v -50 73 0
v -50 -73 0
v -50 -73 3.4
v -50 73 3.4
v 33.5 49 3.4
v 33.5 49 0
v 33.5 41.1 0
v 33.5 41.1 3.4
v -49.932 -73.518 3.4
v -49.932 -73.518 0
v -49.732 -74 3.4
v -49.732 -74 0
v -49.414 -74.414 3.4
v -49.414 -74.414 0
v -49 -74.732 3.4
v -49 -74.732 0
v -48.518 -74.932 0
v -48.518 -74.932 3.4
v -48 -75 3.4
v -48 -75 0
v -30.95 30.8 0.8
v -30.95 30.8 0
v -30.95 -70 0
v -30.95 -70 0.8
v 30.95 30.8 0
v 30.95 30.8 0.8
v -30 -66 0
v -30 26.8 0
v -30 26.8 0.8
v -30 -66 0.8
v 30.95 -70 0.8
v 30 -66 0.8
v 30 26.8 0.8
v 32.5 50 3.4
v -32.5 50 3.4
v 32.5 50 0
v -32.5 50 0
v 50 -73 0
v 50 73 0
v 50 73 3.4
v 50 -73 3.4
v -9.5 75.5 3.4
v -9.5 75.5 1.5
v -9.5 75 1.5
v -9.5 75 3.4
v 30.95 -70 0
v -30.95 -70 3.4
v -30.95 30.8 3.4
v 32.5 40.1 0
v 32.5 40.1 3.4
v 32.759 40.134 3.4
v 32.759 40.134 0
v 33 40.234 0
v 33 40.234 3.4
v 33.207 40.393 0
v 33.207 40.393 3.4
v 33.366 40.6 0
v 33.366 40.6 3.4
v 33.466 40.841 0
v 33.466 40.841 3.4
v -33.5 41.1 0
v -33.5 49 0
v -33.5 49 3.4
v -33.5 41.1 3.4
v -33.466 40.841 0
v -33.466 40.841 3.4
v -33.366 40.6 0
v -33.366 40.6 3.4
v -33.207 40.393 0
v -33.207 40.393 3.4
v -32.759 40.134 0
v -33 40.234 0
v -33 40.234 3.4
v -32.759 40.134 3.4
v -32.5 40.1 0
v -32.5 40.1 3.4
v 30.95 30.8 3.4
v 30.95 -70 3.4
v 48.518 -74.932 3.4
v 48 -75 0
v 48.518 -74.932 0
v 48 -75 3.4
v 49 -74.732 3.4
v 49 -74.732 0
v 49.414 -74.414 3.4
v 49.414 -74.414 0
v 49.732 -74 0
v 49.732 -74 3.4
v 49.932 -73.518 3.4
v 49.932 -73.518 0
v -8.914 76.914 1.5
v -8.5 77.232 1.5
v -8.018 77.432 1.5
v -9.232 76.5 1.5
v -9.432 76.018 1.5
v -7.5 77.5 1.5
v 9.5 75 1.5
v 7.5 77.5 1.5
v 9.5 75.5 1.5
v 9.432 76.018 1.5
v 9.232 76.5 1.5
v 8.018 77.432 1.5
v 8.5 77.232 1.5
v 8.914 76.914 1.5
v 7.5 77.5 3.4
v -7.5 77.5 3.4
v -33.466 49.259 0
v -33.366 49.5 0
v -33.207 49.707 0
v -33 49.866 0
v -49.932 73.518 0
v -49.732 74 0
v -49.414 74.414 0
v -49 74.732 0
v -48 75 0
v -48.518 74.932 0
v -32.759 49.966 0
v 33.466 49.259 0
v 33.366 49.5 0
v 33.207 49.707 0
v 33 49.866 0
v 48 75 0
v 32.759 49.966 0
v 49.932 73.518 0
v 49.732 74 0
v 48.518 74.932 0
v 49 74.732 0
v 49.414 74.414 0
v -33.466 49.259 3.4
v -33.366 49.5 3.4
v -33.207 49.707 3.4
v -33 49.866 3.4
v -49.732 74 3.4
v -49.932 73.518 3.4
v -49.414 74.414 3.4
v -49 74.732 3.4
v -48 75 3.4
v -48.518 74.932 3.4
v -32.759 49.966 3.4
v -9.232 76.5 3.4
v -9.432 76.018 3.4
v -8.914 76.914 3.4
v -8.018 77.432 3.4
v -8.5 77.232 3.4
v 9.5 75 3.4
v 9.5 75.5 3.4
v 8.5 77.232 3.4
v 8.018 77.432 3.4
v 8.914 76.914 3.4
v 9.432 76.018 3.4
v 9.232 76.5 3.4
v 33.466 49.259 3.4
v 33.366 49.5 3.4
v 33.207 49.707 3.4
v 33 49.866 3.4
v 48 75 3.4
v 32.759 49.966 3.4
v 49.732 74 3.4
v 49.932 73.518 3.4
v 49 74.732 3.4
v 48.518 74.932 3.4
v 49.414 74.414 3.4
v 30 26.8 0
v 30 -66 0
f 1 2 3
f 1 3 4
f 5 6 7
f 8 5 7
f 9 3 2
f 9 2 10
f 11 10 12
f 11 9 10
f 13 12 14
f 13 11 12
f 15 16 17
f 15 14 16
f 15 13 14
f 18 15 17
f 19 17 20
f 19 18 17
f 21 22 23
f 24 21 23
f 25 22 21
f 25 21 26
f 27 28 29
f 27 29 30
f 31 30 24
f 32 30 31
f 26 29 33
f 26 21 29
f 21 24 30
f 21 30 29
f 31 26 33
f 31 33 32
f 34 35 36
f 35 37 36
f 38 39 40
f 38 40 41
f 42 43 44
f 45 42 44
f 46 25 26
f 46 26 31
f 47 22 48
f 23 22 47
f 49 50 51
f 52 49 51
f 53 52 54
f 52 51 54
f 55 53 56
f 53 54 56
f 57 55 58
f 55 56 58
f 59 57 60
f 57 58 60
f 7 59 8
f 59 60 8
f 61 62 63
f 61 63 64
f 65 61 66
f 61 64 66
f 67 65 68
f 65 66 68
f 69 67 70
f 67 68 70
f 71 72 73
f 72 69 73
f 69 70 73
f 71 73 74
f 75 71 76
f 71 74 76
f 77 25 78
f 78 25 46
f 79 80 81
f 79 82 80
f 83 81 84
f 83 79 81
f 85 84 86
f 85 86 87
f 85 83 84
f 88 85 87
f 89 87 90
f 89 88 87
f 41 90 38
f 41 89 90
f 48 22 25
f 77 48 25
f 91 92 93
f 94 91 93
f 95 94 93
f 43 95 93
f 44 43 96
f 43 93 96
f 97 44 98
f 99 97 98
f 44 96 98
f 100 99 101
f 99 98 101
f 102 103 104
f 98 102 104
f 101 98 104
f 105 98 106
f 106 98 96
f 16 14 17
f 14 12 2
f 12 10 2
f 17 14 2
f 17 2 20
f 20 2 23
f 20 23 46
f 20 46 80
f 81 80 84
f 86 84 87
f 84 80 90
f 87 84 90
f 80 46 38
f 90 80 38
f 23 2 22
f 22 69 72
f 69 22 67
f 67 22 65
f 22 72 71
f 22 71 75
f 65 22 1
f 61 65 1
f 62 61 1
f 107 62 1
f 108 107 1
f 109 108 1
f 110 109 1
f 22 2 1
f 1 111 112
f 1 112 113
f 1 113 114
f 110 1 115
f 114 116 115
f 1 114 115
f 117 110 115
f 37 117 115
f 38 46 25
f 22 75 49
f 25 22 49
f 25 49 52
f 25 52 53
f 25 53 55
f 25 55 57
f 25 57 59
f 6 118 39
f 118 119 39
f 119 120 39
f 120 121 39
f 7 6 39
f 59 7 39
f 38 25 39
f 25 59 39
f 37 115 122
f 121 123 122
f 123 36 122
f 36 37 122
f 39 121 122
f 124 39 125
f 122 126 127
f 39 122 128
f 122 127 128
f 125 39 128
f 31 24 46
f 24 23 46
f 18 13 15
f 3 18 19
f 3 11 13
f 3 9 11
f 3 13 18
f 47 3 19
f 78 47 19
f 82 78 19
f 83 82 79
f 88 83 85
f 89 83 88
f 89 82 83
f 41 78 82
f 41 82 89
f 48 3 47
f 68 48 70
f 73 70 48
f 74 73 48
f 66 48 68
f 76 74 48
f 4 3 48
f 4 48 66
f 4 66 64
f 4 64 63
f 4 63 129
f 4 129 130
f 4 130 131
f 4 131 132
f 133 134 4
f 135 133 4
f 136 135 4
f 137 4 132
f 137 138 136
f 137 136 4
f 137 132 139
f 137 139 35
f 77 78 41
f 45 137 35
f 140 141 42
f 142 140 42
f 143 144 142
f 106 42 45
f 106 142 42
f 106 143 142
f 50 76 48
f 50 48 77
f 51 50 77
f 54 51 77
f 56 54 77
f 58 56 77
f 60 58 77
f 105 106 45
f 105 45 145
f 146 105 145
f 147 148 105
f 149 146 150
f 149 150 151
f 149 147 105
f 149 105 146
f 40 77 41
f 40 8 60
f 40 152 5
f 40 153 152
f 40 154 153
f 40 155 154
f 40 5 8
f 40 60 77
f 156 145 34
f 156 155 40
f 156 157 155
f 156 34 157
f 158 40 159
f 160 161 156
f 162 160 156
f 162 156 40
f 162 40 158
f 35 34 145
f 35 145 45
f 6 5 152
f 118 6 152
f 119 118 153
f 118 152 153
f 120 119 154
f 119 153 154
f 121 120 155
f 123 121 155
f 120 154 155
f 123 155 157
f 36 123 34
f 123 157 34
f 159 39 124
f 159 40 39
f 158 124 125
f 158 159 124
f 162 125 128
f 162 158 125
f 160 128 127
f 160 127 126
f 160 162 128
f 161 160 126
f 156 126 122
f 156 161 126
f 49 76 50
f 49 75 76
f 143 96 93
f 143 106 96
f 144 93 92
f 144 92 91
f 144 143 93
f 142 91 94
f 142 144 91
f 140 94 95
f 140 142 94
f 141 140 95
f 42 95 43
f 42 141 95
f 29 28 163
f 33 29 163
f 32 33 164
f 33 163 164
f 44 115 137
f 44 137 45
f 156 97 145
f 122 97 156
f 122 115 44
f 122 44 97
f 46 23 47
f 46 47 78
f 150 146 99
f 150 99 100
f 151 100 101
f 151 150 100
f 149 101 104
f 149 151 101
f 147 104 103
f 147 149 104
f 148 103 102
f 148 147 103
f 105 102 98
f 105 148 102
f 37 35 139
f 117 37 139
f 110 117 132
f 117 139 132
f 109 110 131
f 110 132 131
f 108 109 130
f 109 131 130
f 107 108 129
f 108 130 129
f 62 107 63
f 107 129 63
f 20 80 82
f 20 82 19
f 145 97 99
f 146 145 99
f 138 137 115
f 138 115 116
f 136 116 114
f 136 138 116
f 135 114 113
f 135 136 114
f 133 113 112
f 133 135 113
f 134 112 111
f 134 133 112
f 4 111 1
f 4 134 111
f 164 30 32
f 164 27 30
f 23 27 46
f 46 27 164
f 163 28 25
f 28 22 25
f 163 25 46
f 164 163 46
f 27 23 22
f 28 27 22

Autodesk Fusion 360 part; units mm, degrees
sketch "Sketch1" plane through (0, 0, 0) normal (0, 0, 1) x (1, 0, 0)
  line L0 (50, -75) -> (-50, -75)
  line L1 (-50, -75) -> (-50, 75)
  line L2 (-50, 75) -> (50, 75)
  line L3 (50, 75) -> (50, -75)
  line L4 (50, -75) -> (-50, 75) construction
  line L5 (-50, -75) -> (50, 75) construction
  line L6 (9.5, 77.5) -> (-9.5, 77.5)
  line L7 (-9.5, 77.5) -> (-9.5, 75)
  line L8 (9.5, 75) -> (9.5, 77.5)
  line L9 (9.5, 77.5) -> (-9.5, 72.5) construction
  line L10 (-9.5, 77.5) -> (9.5, 72.5) construction
  line L11 (-33.5, 50) -> (33.5, 50)
  line L12 (-33.5, 40.1) -> (33.5, 40.1)
  line L13 (-33.5, 50) -> (-33.5, 40.1)
  line L14 (33.5, 50) -> (33.5, 40.1)
  line L15 (-50, 30.8) -> (50, 30.8)
  line L16 (-33.5, 50) -> (-33.5, 40.1)
  line L17 (33.5, 50) -> (33.5, 40.1)
  line L18 (-50, -70) -> (50, -70)
  line L19 (-30.95, 30.8) -> (-30.95, -70)
  line L20 (0, 30) -> (0, -70)
  line L21 (30.95, 30.8) -> (30.95, -70)
  line L22 (-30, 30.8) -> (-30, -70)
  line L23 (30, 30.8) -> (30, -70)
  line L24 (-30, 26.8) -> (30, 26.8)
  line L25 (-30, -66) -> (30, -66)
  point P0 (0, 75)
  dimension "d1" = 100
  dimension "d2" = 150
  dimension "d3" = 19
  dimension "d4" = 5
  dimension "d5" = 25
  dimension "d6" = 9.9
  dimension "d8" = 9.3
  dimension "d9" = 5
  dimension "d10" = 30.95
  dimension "d11" = 30
  dimension "d12" = 4
  dimension "d13" = 4
extrude "Extrude1" add sketch "Sketch1" along normal blind 3.4 contours L0 L1 L3 L18 | L3 L15 L18 L21 | L1 L15 L18 L19 | L1 L2 L3 L15 | L2 L6 L7 L8 makes body 1
extrude "Extrude2" add sketch "Sketch1" along normal blind 0.8 separate body contours L15 L18 L21 L23 | L15 L18 L19 L22 | L18 L20 L23 L25 | L18 L20 L22 L25 | L15 L22 L23 L24 makes body 2
fillet "Fillet1" radius 2 6 edges at (50, 75, 1.7) (-50, 75, 1.7) (-9.5, 77.5, 1.7) (9.5, 77.5, 1.7) (-50, -75, 1.7) (50, -75, 1.7) on bodies 1
fillet "Fillet2" radius 1 4 edges at (33.5, 40.1, 1.7) (33.5, 50, 1.7) (-33.5, 50, 1.7) (-33.5, 40.1, 1.7) on bodies 1
extrude "Extrude3" cut sketch "Sketch1" along normal blind 1.5 contours L2 L6 L7 L8 bodies 1
